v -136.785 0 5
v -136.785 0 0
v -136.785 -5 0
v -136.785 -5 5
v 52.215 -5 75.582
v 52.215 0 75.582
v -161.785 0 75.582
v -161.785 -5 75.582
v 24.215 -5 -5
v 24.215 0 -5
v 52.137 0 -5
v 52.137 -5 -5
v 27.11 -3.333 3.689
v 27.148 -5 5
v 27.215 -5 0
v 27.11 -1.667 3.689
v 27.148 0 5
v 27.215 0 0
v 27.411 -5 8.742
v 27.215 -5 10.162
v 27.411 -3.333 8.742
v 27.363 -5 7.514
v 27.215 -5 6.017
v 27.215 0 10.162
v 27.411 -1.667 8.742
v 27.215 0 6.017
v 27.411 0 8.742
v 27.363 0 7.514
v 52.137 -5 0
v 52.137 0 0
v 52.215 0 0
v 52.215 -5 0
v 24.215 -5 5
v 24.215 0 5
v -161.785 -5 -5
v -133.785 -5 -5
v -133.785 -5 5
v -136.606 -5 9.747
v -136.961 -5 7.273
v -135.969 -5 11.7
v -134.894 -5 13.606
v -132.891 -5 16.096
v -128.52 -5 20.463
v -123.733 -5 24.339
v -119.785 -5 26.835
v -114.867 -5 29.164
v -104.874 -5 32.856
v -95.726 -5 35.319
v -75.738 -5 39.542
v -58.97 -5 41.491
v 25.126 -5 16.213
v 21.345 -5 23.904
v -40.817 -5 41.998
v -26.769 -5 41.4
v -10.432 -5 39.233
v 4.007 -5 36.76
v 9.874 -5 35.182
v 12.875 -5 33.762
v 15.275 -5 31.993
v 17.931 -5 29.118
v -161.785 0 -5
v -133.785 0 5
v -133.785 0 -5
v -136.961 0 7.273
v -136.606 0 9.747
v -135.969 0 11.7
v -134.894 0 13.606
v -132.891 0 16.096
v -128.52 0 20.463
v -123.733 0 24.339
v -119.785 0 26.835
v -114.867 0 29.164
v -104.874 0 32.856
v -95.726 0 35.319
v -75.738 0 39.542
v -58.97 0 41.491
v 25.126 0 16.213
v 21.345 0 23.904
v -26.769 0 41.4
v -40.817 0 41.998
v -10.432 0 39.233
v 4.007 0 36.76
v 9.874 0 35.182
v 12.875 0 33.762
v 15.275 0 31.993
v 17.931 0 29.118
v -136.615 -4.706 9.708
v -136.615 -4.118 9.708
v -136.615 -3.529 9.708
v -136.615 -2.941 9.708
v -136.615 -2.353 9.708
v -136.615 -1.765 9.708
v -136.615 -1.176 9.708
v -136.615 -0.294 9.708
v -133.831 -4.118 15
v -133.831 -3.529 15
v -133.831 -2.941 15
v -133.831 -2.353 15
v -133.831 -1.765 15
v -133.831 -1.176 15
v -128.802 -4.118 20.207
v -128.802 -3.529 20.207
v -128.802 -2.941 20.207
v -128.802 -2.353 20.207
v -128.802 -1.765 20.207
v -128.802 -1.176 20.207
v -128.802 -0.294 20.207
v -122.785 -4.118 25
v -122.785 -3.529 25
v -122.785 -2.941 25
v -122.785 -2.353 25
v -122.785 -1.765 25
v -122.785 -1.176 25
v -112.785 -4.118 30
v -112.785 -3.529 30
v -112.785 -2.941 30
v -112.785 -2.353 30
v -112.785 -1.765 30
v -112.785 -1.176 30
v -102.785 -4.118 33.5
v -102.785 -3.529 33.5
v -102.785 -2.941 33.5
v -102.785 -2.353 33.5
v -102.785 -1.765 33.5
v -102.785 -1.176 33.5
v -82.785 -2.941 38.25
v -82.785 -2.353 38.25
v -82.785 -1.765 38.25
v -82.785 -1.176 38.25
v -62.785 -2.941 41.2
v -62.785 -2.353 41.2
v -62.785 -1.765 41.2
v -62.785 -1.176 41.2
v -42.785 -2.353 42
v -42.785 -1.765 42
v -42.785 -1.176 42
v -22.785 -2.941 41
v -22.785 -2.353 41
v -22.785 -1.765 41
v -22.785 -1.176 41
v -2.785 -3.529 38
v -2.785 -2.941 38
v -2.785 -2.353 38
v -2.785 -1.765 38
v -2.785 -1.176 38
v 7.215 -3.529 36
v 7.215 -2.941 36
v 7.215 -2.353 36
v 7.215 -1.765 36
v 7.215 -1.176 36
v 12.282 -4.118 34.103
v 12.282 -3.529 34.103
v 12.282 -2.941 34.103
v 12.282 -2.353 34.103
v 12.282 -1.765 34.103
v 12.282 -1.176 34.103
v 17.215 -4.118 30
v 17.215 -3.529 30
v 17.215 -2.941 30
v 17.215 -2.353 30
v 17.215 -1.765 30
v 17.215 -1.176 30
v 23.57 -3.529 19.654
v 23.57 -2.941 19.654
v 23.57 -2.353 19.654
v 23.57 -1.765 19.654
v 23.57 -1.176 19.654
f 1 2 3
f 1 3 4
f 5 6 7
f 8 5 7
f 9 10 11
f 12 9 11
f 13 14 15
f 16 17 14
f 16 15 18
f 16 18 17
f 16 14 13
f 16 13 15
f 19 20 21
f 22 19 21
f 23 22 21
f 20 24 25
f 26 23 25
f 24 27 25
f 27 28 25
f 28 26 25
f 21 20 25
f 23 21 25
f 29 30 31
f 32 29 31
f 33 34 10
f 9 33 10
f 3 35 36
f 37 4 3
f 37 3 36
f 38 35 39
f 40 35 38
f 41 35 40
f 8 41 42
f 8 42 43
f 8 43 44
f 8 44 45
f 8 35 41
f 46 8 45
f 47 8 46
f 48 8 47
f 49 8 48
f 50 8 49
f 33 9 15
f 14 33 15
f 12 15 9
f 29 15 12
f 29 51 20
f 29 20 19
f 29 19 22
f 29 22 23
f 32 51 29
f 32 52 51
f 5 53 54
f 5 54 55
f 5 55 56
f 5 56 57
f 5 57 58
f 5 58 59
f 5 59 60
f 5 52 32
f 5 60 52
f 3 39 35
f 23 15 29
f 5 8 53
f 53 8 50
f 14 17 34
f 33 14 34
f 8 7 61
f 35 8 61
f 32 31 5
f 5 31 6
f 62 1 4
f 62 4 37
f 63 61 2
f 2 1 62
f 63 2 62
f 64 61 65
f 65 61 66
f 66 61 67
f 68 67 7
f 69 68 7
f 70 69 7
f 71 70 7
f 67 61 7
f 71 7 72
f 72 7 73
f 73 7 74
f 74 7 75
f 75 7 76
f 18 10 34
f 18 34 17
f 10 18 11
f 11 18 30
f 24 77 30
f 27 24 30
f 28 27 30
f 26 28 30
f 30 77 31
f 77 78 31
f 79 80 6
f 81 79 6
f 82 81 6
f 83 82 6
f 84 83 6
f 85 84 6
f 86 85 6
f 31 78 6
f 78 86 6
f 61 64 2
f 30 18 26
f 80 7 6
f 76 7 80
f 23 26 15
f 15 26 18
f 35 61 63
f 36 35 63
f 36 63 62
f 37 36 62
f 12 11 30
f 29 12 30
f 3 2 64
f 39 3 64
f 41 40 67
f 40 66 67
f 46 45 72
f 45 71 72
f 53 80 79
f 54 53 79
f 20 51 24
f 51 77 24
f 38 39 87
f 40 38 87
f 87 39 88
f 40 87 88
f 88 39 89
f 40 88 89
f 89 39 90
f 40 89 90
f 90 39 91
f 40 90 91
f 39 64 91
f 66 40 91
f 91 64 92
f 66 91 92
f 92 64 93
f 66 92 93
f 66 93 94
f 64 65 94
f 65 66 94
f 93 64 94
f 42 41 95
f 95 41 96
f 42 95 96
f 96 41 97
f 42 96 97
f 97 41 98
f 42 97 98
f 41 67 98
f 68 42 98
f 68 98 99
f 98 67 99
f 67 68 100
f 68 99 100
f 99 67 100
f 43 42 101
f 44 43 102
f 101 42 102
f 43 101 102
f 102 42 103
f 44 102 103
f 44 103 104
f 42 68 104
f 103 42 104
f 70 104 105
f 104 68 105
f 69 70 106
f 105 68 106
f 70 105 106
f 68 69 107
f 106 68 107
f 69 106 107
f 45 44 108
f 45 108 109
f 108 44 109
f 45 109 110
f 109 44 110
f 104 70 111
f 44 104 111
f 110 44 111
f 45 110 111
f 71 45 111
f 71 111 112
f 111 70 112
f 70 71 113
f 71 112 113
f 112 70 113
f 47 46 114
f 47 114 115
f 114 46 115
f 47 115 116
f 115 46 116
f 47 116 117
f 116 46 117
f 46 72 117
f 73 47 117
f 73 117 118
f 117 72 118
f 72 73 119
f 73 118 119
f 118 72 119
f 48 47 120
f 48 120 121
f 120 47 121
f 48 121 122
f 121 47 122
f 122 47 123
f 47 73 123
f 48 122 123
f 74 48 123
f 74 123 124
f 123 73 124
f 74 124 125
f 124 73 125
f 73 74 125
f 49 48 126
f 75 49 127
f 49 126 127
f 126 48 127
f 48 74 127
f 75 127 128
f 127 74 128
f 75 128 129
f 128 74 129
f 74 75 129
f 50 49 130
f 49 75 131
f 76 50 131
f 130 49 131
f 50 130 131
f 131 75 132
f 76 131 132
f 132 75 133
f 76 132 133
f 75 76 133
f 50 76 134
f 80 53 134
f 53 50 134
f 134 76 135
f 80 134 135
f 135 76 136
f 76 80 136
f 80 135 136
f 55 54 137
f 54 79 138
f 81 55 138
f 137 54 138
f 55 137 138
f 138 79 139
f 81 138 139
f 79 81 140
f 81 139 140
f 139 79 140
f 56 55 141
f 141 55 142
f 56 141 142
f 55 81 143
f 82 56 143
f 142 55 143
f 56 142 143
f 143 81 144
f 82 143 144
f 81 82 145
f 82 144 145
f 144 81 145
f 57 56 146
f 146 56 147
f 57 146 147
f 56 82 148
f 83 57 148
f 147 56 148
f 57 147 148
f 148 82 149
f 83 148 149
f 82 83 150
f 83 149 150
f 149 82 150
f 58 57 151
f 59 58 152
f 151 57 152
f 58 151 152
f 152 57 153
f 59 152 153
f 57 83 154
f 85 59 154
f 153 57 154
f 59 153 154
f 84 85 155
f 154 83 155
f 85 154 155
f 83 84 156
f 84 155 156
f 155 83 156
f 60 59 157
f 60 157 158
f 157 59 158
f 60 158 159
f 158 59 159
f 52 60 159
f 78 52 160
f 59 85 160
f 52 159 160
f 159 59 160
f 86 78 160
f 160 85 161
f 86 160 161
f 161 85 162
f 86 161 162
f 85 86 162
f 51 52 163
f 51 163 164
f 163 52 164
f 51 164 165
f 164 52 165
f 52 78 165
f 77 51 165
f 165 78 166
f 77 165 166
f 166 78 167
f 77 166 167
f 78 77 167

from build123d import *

# Parameters (mm, degrees)
F0_W     = 3
F0_H     = 5
F1_DEPTH = 5


with BuildPart() as f1:
    # F0 (on Front) → F1 (new body)
    with BuildSketch(Plane.XZ):
        Polygon((-153.931453824, 0), (-155.1526284828, 0), (-161.7847054601, 0), (-161.7847054601, -5), (-133.7847054601, -5), (-133.7847054601, 0), (-136.7847054601, 0), (-151.8627256155, 0), align=None)
        with Locations((-135.2847054601, 2.5)):
            Rectangle(F0_W, F0_H)
        with BuildLine():
            Line((-161.7847054601, 0), (-155.1526284828, 0))
            Line((-155.1526284828, 0), (-153.931453824, 0))
            Line((-153.931453824, 0), (-151.8627256155, 0))
            Line((-151.8627256155, 0), (-136.7847054601, 0))
            add(Edge.make_bspline(
                [(-136.7847054601, 0), (-137.550605581, 9.1907943609), (-135.5620132118, 14.1735625634), (-123.0103345841, 25.7878123059), (-113.0063506641, 30.0053916685), (-102.8318059019, 33.7226779983), (-92.7984950175, 35.9731800942), (-82.8100310019, 38.3552919351), (-72.8042943257, 40.0781384311), (-62.798577269, 41.3146029444), (-52.7879988202, 41.8561243727), (-42.7852293417, 42.0597226825), (-32.7769905911, 41.9048535139), (-22.7692720043, 41.1183686559), (-12.7682307799, 39.611832621), (-2.8094485421, 38.0255290619), (7.6206097812, 36.2310917), (18.4393837123, 32.1627572859), (26.3010010822, 14.3455654248), (27.2152945399, 10.1618142799)],
                knots=[0, 0, 0, 0, 0.0644493237, 0.1280755407, 0.1831904296, 0.2368426895, 0.2897631564, 0.3425351335, 0.395054152, 0.4473652388, 0.4995365313, 0.5516661866, 0.6037958419, 0.6560034853, 0.7083814826, 0.7608363672, 0.8134744142, 0.8697637546, 0.9474555247, 0.9474555247, 0.9474555247, 0.9474555247], degree=3))
            add(Edge.make_bspline(
                [(27.2152945399, 10.1618142799), (27.5799221206, 8.4933006912), (27.3649107752, 7.8026010468), (27.2152945399, 6.0168802749)],
                knots=[0.9474555247, 0.9474555247, 0.9474555247, 0.9474555247, 0.9784396272, 0.9784396272, 0.9784396272, 0.9784396272], degree=3))
            Line((27.2152945399, 6.0168802749), (27.2152945399, 5))
            Line((27.2152945399, 5), (27.2152945399, 0))
            Line((27.2152945399, 0), (52.1374652833, 0))
            Line((52.1374652833, 0), (52.2152945399, 0))
            Line((52.2152945399, 0), (52.2152945399, 75.5819380283))
            Line((52.2152945399, 75.5819380283), (-161.7847054601, 75.5819380283))
            Line((-161.7847054601, 75.5819380283), (-161.7847054601, 0))
        make_face()
        with BuildLine():
            Line((24.2152945399, 5), (24.2152945399, 0))
            Line((24.2152945399, 0), (27.2152945399, 0))
            add(Edge.make_bspline(
                [(27.1477780723, 5), (27.0906424161, 3.8338027227), (27.081911119, 2.26751635), (27.2152945399, 0)],
                knots=[0.9837117694, 0.9837117694, 0.9837117694, 0.9837117694, 1, 1, 1, 1], degree=3))
            Line((27.1477780723, 5), (24.2152945399, 5))
        make_face()
        Polygon((52.1374652833, -5), (52.1374652833, 0), (27.2152945399, 0), (24.2152945399, 0), (24.2152945399, -5), align=None)
    extrude(amount=F1_DEPTH)


solid = f1.part
